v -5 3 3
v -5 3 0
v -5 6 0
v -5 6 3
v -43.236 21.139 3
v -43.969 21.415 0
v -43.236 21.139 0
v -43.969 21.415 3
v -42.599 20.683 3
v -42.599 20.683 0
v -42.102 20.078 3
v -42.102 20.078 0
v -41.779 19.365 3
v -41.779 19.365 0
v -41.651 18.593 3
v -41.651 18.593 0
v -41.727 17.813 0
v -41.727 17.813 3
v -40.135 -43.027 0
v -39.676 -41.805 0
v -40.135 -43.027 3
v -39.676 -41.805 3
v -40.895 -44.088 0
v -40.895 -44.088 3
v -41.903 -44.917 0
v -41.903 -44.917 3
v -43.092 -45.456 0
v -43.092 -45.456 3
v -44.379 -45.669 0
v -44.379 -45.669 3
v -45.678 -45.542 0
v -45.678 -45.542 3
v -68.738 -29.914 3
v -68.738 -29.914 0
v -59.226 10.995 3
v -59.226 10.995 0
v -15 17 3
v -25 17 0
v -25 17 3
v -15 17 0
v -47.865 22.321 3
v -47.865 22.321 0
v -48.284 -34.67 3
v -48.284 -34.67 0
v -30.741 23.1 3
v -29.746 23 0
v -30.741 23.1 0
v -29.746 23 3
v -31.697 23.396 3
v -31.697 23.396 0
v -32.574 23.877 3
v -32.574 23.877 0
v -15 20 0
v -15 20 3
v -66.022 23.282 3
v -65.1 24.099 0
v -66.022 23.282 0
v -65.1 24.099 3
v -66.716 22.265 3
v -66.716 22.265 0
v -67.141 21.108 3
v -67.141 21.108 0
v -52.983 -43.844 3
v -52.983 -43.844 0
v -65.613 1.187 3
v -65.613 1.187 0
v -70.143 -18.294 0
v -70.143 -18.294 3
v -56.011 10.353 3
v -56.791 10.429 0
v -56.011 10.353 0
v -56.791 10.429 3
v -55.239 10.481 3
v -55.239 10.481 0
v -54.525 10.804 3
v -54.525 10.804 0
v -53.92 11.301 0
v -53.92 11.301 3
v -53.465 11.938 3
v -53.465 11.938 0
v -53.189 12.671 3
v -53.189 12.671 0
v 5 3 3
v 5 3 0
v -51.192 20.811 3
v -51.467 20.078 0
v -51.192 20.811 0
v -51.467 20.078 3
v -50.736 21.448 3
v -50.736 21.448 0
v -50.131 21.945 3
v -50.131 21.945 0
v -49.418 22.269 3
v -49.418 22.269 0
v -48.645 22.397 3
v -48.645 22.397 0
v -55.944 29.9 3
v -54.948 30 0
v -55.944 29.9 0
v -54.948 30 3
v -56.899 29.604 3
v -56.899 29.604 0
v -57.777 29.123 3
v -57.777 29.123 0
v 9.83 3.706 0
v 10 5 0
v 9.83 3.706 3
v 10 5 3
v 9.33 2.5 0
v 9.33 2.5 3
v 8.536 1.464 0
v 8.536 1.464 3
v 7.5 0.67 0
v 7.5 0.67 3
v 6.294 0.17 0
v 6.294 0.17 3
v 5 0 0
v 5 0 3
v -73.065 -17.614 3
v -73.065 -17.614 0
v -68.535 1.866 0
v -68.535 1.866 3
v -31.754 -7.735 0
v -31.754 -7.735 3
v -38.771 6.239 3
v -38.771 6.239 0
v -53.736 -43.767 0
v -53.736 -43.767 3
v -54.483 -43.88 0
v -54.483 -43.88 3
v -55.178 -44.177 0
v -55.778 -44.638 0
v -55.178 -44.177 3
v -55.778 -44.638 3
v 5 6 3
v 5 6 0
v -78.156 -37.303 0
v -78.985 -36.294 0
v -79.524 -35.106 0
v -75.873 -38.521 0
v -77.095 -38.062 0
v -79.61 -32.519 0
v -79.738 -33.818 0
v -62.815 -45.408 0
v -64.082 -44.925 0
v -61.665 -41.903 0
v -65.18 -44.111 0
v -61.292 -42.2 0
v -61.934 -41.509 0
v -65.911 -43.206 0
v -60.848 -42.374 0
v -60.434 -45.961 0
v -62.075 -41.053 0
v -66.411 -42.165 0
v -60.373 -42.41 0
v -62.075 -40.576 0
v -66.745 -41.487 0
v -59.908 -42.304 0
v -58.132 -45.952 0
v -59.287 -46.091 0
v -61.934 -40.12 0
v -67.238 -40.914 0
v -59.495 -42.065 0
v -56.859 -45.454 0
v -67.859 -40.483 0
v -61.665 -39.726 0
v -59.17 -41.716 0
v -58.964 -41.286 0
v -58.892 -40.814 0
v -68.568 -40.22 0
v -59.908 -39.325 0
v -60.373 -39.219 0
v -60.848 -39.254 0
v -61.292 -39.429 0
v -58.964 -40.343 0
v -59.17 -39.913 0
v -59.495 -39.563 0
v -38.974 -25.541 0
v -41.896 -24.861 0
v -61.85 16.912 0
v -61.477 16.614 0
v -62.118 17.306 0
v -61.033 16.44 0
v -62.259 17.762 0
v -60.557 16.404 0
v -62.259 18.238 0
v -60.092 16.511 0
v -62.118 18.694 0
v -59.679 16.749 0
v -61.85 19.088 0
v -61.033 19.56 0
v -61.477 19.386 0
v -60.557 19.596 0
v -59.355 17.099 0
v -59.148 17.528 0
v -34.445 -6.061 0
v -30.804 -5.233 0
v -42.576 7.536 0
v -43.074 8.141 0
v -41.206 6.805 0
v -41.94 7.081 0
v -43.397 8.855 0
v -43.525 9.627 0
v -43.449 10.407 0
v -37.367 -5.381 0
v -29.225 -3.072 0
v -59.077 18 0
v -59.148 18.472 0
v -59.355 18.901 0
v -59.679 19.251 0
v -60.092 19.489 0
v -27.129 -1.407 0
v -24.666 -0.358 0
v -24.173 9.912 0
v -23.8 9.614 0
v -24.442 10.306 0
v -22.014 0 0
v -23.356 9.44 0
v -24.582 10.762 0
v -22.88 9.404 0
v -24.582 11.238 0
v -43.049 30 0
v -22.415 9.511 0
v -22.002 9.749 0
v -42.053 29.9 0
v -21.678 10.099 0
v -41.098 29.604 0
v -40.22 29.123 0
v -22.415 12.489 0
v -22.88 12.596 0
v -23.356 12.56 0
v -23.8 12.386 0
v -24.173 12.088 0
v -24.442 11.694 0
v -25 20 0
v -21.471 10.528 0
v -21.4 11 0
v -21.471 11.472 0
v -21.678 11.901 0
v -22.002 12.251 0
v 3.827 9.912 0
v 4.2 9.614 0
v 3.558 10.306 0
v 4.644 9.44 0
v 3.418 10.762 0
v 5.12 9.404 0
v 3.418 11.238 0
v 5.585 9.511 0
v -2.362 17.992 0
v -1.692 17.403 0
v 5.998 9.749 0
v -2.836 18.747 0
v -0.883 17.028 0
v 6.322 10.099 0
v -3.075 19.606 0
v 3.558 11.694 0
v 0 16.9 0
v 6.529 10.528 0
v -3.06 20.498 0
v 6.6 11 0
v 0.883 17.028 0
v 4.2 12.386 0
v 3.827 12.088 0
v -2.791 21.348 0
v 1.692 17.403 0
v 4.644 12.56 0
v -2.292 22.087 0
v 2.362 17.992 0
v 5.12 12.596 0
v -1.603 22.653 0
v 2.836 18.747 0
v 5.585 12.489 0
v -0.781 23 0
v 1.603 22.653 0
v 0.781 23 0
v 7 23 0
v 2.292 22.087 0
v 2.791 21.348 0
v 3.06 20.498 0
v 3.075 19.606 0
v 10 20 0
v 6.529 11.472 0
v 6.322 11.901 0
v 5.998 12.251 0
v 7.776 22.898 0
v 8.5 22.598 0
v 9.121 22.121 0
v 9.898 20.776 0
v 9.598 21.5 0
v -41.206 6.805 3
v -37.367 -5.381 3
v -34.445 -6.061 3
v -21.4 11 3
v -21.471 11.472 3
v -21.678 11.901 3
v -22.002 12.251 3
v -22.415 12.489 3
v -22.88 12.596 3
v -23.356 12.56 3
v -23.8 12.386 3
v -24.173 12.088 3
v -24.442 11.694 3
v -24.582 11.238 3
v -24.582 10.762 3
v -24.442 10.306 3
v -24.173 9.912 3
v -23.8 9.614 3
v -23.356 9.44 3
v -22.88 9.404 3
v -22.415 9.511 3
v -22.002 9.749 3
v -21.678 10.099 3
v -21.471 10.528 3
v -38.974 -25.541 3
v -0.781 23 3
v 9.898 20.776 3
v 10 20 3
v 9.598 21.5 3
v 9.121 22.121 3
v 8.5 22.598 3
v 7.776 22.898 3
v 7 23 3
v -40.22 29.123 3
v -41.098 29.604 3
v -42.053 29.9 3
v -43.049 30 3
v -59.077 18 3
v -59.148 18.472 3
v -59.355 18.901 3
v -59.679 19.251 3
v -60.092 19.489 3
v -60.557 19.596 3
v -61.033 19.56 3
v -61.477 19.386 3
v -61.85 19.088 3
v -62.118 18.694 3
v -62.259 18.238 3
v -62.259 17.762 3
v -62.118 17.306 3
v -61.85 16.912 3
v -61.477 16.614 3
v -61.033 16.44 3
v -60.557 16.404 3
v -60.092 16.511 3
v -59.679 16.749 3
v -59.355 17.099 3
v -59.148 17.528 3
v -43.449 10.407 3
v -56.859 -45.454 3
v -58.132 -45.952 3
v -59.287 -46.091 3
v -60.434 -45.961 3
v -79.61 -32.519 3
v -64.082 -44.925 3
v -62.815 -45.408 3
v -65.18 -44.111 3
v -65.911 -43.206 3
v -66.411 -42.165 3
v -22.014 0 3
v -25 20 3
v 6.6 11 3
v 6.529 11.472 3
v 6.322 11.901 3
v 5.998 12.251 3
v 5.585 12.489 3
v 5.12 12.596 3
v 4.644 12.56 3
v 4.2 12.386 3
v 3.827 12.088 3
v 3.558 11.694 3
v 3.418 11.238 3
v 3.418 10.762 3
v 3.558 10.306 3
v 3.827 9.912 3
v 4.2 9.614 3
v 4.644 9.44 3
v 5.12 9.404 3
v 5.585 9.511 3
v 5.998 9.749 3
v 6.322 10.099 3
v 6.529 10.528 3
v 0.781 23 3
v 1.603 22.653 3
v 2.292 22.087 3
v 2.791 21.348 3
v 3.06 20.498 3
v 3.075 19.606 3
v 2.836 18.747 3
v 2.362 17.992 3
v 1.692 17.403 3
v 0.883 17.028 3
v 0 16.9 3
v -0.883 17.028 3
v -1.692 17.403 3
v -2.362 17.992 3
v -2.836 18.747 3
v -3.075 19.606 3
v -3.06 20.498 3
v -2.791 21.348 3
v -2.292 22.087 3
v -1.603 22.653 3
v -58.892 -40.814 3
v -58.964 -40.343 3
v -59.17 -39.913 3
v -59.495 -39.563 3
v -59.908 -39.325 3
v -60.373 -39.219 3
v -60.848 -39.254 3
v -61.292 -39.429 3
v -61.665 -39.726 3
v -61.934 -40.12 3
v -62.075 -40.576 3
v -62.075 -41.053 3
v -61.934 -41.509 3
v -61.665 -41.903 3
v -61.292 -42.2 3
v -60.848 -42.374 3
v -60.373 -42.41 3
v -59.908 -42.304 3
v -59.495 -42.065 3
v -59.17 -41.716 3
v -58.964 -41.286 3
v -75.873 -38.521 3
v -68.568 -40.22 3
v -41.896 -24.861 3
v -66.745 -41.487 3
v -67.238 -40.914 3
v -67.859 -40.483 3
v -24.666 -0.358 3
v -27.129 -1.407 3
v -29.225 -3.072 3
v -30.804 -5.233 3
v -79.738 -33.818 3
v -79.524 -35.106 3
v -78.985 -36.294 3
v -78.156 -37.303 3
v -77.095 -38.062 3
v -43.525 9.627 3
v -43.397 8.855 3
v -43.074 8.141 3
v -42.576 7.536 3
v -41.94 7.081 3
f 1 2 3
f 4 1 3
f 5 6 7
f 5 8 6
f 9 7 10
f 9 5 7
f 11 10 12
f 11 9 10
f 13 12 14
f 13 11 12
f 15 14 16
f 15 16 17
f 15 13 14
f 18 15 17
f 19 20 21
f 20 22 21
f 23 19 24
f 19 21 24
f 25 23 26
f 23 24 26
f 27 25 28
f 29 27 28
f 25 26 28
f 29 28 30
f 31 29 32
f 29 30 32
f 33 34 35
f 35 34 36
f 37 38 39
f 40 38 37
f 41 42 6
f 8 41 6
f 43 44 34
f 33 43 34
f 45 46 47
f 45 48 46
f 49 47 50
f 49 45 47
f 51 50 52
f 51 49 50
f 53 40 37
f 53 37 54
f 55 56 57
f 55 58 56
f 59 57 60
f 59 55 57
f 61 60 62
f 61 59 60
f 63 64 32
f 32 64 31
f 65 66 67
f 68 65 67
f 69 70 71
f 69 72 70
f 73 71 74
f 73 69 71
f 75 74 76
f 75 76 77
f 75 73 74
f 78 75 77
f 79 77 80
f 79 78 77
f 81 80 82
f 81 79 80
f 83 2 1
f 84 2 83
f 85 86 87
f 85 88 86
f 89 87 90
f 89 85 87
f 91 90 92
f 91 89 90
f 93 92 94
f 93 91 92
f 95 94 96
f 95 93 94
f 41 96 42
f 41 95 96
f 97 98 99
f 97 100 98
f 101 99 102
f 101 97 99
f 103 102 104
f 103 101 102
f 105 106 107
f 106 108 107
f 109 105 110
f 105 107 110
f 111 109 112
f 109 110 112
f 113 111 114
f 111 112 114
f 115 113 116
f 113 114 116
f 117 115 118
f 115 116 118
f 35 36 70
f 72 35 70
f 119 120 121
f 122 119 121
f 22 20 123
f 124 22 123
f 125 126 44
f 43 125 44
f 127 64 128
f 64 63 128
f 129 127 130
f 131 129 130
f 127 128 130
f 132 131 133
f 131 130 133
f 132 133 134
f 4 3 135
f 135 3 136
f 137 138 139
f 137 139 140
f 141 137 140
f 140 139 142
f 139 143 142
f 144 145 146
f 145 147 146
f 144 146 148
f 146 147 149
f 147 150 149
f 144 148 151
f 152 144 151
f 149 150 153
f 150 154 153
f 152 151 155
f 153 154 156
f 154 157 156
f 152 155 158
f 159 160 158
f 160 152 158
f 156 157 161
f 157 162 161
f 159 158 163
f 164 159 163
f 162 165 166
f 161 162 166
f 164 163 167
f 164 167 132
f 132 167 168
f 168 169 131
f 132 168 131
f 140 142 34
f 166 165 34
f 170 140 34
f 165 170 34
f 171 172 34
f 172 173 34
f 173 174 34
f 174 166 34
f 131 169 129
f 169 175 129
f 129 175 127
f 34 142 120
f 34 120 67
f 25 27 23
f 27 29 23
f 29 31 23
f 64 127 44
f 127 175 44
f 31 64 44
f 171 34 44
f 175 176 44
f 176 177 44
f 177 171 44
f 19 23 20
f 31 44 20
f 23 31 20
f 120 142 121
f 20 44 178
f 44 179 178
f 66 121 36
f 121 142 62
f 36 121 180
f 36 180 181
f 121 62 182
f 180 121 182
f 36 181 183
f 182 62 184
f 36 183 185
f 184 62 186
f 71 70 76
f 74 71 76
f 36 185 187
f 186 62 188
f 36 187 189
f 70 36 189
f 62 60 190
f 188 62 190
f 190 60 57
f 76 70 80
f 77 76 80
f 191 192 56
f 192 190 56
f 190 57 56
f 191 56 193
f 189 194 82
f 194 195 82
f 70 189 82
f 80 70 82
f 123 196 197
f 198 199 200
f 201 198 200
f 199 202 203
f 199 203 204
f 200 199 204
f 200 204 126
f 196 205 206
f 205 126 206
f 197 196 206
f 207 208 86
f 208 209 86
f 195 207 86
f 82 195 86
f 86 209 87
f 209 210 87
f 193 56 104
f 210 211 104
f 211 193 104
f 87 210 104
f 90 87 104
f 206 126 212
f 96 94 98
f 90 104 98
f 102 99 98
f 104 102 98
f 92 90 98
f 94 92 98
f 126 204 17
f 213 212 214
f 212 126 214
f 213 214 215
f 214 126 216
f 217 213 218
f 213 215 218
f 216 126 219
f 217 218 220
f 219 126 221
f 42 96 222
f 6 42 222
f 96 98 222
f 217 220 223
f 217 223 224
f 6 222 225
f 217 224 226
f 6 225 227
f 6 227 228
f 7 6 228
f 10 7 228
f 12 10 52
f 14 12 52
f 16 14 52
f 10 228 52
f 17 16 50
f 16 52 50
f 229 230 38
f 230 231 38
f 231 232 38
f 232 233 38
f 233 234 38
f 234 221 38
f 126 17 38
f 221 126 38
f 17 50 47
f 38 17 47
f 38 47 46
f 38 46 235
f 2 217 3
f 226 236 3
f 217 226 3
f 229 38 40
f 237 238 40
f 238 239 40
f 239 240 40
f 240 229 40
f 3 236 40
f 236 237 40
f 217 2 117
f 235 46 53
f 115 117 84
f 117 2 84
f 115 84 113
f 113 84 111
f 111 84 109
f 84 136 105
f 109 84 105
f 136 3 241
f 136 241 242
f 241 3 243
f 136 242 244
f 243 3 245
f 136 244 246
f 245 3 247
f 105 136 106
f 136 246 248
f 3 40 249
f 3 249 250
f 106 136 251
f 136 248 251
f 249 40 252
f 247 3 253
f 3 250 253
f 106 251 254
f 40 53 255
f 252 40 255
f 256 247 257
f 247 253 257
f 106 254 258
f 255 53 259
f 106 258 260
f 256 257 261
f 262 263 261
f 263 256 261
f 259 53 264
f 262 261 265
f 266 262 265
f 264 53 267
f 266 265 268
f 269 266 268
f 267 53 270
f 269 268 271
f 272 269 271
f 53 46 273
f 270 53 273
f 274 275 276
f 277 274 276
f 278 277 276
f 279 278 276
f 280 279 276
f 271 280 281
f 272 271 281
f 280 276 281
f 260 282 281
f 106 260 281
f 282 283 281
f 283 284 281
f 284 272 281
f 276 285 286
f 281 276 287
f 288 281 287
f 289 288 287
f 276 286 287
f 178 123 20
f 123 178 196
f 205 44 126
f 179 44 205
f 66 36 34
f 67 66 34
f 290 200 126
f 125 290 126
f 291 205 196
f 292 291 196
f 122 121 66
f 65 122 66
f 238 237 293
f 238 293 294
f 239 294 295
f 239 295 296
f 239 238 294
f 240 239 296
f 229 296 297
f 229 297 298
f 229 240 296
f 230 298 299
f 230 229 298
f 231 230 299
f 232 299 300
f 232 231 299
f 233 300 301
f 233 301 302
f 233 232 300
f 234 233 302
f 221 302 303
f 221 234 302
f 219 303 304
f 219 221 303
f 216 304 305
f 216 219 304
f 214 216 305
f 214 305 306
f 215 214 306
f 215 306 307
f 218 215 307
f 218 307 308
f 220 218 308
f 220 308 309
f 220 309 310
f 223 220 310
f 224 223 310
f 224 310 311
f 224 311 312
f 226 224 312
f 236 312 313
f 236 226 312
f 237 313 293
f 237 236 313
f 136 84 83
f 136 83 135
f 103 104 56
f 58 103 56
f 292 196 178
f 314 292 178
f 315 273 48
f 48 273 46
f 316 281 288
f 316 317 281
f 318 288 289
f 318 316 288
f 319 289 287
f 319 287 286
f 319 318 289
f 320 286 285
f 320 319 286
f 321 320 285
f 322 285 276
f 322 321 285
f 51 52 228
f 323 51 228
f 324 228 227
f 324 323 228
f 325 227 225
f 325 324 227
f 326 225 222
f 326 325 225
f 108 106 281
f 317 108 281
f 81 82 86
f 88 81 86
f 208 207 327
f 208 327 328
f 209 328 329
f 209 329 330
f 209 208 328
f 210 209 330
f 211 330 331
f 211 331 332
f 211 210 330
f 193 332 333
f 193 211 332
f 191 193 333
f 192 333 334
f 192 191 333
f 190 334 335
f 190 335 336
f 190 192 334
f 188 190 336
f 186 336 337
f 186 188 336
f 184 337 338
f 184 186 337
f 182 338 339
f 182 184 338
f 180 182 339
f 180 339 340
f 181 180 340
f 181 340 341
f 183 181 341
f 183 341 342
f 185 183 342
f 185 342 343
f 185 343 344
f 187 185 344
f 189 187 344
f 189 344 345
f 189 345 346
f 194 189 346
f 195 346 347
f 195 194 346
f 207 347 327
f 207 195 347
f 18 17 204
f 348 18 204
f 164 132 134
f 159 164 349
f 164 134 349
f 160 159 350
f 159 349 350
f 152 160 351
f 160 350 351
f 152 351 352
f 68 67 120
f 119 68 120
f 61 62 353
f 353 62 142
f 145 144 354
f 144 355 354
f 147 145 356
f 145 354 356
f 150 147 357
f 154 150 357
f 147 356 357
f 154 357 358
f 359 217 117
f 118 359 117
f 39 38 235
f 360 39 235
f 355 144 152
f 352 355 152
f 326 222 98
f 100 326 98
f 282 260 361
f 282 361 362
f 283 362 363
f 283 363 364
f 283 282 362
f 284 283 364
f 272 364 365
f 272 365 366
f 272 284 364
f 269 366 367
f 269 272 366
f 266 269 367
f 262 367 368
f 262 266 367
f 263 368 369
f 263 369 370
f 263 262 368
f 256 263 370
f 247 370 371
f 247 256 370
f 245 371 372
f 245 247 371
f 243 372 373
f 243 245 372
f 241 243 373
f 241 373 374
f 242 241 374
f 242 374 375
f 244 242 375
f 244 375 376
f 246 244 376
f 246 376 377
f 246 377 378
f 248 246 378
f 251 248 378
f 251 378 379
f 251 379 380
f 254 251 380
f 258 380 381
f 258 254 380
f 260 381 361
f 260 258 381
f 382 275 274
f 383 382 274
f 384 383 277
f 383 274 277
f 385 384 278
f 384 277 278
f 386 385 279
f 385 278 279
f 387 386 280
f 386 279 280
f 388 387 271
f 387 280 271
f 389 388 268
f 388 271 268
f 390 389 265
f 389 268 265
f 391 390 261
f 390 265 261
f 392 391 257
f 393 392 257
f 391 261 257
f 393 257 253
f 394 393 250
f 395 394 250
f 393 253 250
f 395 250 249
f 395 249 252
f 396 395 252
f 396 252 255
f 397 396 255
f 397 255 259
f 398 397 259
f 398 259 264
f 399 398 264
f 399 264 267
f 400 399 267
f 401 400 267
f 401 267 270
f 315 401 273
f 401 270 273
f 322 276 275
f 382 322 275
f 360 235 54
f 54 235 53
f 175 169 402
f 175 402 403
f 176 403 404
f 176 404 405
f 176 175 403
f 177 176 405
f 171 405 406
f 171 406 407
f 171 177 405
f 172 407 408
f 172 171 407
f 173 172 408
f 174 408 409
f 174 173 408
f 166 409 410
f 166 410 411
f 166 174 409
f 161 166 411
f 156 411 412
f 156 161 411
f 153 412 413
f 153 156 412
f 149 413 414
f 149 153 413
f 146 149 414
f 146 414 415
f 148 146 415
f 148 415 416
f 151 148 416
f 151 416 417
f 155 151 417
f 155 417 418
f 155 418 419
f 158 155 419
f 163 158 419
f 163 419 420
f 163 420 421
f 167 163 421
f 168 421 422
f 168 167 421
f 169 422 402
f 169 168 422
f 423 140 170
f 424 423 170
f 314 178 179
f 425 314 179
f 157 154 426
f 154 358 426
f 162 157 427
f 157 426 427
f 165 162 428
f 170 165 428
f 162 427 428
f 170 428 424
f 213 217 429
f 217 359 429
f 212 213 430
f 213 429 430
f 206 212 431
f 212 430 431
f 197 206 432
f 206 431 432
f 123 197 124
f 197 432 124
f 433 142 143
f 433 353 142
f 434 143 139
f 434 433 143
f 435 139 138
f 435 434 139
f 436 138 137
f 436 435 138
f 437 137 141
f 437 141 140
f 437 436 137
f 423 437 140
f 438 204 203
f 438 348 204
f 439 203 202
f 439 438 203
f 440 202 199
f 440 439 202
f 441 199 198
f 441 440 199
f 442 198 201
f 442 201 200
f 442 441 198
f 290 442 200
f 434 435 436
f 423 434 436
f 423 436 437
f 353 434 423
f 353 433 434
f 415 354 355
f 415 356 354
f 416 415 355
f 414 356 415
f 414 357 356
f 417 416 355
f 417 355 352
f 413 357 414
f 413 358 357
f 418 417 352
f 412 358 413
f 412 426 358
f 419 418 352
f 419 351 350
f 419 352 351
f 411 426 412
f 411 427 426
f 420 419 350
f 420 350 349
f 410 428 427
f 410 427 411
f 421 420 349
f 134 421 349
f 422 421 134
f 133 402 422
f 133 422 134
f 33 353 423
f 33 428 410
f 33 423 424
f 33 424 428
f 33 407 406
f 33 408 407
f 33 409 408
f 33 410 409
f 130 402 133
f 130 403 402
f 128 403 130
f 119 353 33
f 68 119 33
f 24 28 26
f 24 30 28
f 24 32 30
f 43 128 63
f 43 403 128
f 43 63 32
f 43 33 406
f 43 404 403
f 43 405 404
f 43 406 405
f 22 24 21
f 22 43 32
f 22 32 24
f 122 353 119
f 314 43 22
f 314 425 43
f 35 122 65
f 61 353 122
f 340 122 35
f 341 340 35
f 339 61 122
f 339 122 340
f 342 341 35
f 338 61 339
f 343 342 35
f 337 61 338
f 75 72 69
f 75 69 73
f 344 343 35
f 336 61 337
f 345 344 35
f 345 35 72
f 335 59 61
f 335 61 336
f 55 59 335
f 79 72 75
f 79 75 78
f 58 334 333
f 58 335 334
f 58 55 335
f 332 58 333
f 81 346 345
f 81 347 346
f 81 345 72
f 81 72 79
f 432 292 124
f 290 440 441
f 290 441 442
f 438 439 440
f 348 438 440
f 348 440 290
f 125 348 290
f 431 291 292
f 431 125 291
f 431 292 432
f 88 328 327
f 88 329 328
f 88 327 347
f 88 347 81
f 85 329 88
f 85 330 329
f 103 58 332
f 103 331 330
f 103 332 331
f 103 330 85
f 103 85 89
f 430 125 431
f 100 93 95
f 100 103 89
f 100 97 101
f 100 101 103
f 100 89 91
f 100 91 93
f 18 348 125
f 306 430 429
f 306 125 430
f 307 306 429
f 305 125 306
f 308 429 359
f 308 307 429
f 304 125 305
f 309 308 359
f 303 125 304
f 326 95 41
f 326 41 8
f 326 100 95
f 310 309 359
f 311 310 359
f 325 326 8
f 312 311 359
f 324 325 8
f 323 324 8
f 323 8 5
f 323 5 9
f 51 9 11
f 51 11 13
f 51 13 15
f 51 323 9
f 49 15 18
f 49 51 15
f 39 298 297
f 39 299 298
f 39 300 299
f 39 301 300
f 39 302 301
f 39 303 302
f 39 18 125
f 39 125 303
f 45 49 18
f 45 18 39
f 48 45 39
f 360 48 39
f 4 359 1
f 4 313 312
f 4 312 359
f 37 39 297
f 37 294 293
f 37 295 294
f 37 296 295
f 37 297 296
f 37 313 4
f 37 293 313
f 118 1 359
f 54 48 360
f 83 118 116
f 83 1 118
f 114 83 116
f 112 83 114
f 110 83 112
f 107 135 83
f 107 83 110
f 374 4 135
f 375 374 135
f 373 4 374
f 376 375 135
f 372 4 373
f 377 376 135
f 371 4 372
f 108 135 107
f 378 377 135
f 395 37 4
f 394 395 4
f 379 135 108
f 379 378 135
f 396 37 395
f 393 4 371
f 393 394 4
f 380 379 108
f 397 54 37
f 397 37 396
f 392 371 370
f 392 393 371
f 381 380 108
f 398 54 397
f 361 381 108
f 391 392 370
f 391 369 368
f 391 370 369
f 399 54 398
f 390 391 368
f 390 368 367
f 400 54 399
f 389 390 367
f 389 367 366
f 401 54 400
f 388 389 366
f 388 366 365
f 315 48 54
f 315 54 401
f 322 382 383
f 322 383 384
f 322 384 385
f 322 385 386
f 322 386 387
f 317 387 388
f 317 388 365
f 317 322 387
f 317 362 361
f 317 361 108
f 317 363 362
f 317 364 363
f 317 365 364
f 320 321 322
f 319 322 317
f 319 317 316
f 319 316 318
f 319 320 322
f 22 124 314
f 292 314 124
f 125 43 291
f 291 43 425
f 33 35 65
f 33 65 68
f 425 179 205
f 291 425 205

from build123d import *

# Parameters (mm, degrees)
ESBO_O1_R                = 1.6
ESBO_O1_W                = 10
ESBO_O1_H                = 3
RESSALTO_EXTRUS_O1_DEPTH = 3
FILETE1_R                = 5
FILETE3_R                = 3
FILETE4_R                = 10
FILETE2_R                = 5


with BuildPart() as part:
    # Esboço1 → Ressalto-extrusão1 (new body)
    with BuildSketch(Plane.XY):
        with BuildLine():
            Line((-0.781024968, 23), (-31.296028058, 23))
            Line((-31.296028058, 23), (-41.498532893, 30))
            Line((-41.498532893, 30), (-56.498532893, 30))
            Line((-56.498532893, 30), (-66.701037728, 23))
            Line((-66.701037728, 23), (-80.742879141, -37.388961655))
            Line((-80.742879141, -37.388961655), (-65.645638728, -40.899422008))
            Line((-65.645638728, -40.899422008), (-66.494943652, -44.551980173))
            Line((-66.494943652, -44.551980173), (-56.754788546, -46.816793304))
            Line((-56.754788546, -46.816793304), (-55.905483622, -43.164235139))
            Line((-55.905483622, -43.164235139), (-40.808243208, -46.674695492))
            Line((-40.808243208, -46.674695492), (-29.955288394, 0))
            Line((-29.955288394, 0), (10, 0))
            Line((10, 0), (10, 23))
            Line((10, 23), (0.781024968, 23))
            ThreePointArc((0.781024968, 23), (0, 16.9), (-0.781024968, 23))
        make_face()
        with Locations((-60.492459533, -40.814309185)):
            Circle(ESBO_O1_R, mode=Mode.SUBTRACT)
        Polygon((-34.444555902, -6.06061562), (-38.974182165, -25.540925831), (-41.896228696, -24.861481892), (-37.366602434, -5.381171681), align=None, mode=Mode.SUBTRACT)
        Polygon((-70.142678503, -18.293523812), (-73.064725034, -17.614079872), (-68.535098772, 1.866230339), (-65.61305224, 1.1867864), align=None, mode=Mode.SUBTRACT)
        Polygon((-53.868610446, 9.749384541), (-50.787533444, 23), (-41.047378339, 20.735186869), (-44.12845534, 7.48457141), (-38.771370032, 6.238924188), (-48.283585183, -34.669727256), (-68.737910905, -29.91361968), (-59.225695754, 10.995031763), align=None, mode=Mode.SUBTRACT)
        with Locations((-60.676910422, 18)):
            Circle(ESBO_O1_R, mode=Mode.SUBTRACT)
        with Locations((0, 4.5)):
            Rectangle(ESBO_O1_W, ESBO_O1_H, mode=Mode.SUBTRACT)
        with Locations((-23, 11)):
            Circle(ESBO_O1_R, mode=Mode.SUBTRACT)
        with Locations((-20, 18.5)):
            Rectangle(ESBO_O1_W, ESBO_O1_H, mode=Mode.SUBTRACT)
        with Locations((5, 11)):
            Circle(ESBO_O1_R, mode=Mode.SUBTRACT)
    extrude(amount=RESSALTO_EXTRUS_O1_DEPTH)

    # Filete1
    filete1_edges = [part.edges().sort_by_distance(p)[0] for p in [
        (10, 0, 1.5),
        (-40.808243208, -46.674695492, 1.5),
        (-80.742879141, -37.388961655, 1.5),
    ]]
    fillet(filete1_edges, radius=FILETE1_R)

    # Filete3
    filete3_edges = [part.edges().sort_by_distance(p)[0] for p in [
        (10, 23, 1.5),
        (-55.905483622, -43.164235139, 1.5),
        (-65.645638728, -40.899422008, 1.5),
        (-53.868610446, 9.749384541, 1.5),
        (-44.12845534, 7.48457141, 1.5),
        (-41.047378339, 20.735186869, 1.5),
        (-50.787533444, 23, 1.5),
    ]]
    fillet(filete3_edges, radius=FILETE3_R)

    # Filete4
    filete4_edges = [part.edges().sort_by_distance(p)[0] for p in [
        (-29.955288394, 0, 1.5),
    ]]
    fillet(filete4_edges, radius=FILETE4_R)

    # Filete2
    filete2_edges = [part.edges().sort_by_distance(p)[0] for p in [
        (-56.754788546, -46.816793304, 1.5),
        (-66.494943652, -44.551980173, 1.5),
        (-31.296028058, 23, 1.5),
        (-41.498532893, 30, 1.5),
        (-56.498532893, 30, 1.5),
        (-66.701037728, 23, 1.5),
    ]]
    fillet(filete2_edges, radius=FILETE2_R)


solid = part.part
